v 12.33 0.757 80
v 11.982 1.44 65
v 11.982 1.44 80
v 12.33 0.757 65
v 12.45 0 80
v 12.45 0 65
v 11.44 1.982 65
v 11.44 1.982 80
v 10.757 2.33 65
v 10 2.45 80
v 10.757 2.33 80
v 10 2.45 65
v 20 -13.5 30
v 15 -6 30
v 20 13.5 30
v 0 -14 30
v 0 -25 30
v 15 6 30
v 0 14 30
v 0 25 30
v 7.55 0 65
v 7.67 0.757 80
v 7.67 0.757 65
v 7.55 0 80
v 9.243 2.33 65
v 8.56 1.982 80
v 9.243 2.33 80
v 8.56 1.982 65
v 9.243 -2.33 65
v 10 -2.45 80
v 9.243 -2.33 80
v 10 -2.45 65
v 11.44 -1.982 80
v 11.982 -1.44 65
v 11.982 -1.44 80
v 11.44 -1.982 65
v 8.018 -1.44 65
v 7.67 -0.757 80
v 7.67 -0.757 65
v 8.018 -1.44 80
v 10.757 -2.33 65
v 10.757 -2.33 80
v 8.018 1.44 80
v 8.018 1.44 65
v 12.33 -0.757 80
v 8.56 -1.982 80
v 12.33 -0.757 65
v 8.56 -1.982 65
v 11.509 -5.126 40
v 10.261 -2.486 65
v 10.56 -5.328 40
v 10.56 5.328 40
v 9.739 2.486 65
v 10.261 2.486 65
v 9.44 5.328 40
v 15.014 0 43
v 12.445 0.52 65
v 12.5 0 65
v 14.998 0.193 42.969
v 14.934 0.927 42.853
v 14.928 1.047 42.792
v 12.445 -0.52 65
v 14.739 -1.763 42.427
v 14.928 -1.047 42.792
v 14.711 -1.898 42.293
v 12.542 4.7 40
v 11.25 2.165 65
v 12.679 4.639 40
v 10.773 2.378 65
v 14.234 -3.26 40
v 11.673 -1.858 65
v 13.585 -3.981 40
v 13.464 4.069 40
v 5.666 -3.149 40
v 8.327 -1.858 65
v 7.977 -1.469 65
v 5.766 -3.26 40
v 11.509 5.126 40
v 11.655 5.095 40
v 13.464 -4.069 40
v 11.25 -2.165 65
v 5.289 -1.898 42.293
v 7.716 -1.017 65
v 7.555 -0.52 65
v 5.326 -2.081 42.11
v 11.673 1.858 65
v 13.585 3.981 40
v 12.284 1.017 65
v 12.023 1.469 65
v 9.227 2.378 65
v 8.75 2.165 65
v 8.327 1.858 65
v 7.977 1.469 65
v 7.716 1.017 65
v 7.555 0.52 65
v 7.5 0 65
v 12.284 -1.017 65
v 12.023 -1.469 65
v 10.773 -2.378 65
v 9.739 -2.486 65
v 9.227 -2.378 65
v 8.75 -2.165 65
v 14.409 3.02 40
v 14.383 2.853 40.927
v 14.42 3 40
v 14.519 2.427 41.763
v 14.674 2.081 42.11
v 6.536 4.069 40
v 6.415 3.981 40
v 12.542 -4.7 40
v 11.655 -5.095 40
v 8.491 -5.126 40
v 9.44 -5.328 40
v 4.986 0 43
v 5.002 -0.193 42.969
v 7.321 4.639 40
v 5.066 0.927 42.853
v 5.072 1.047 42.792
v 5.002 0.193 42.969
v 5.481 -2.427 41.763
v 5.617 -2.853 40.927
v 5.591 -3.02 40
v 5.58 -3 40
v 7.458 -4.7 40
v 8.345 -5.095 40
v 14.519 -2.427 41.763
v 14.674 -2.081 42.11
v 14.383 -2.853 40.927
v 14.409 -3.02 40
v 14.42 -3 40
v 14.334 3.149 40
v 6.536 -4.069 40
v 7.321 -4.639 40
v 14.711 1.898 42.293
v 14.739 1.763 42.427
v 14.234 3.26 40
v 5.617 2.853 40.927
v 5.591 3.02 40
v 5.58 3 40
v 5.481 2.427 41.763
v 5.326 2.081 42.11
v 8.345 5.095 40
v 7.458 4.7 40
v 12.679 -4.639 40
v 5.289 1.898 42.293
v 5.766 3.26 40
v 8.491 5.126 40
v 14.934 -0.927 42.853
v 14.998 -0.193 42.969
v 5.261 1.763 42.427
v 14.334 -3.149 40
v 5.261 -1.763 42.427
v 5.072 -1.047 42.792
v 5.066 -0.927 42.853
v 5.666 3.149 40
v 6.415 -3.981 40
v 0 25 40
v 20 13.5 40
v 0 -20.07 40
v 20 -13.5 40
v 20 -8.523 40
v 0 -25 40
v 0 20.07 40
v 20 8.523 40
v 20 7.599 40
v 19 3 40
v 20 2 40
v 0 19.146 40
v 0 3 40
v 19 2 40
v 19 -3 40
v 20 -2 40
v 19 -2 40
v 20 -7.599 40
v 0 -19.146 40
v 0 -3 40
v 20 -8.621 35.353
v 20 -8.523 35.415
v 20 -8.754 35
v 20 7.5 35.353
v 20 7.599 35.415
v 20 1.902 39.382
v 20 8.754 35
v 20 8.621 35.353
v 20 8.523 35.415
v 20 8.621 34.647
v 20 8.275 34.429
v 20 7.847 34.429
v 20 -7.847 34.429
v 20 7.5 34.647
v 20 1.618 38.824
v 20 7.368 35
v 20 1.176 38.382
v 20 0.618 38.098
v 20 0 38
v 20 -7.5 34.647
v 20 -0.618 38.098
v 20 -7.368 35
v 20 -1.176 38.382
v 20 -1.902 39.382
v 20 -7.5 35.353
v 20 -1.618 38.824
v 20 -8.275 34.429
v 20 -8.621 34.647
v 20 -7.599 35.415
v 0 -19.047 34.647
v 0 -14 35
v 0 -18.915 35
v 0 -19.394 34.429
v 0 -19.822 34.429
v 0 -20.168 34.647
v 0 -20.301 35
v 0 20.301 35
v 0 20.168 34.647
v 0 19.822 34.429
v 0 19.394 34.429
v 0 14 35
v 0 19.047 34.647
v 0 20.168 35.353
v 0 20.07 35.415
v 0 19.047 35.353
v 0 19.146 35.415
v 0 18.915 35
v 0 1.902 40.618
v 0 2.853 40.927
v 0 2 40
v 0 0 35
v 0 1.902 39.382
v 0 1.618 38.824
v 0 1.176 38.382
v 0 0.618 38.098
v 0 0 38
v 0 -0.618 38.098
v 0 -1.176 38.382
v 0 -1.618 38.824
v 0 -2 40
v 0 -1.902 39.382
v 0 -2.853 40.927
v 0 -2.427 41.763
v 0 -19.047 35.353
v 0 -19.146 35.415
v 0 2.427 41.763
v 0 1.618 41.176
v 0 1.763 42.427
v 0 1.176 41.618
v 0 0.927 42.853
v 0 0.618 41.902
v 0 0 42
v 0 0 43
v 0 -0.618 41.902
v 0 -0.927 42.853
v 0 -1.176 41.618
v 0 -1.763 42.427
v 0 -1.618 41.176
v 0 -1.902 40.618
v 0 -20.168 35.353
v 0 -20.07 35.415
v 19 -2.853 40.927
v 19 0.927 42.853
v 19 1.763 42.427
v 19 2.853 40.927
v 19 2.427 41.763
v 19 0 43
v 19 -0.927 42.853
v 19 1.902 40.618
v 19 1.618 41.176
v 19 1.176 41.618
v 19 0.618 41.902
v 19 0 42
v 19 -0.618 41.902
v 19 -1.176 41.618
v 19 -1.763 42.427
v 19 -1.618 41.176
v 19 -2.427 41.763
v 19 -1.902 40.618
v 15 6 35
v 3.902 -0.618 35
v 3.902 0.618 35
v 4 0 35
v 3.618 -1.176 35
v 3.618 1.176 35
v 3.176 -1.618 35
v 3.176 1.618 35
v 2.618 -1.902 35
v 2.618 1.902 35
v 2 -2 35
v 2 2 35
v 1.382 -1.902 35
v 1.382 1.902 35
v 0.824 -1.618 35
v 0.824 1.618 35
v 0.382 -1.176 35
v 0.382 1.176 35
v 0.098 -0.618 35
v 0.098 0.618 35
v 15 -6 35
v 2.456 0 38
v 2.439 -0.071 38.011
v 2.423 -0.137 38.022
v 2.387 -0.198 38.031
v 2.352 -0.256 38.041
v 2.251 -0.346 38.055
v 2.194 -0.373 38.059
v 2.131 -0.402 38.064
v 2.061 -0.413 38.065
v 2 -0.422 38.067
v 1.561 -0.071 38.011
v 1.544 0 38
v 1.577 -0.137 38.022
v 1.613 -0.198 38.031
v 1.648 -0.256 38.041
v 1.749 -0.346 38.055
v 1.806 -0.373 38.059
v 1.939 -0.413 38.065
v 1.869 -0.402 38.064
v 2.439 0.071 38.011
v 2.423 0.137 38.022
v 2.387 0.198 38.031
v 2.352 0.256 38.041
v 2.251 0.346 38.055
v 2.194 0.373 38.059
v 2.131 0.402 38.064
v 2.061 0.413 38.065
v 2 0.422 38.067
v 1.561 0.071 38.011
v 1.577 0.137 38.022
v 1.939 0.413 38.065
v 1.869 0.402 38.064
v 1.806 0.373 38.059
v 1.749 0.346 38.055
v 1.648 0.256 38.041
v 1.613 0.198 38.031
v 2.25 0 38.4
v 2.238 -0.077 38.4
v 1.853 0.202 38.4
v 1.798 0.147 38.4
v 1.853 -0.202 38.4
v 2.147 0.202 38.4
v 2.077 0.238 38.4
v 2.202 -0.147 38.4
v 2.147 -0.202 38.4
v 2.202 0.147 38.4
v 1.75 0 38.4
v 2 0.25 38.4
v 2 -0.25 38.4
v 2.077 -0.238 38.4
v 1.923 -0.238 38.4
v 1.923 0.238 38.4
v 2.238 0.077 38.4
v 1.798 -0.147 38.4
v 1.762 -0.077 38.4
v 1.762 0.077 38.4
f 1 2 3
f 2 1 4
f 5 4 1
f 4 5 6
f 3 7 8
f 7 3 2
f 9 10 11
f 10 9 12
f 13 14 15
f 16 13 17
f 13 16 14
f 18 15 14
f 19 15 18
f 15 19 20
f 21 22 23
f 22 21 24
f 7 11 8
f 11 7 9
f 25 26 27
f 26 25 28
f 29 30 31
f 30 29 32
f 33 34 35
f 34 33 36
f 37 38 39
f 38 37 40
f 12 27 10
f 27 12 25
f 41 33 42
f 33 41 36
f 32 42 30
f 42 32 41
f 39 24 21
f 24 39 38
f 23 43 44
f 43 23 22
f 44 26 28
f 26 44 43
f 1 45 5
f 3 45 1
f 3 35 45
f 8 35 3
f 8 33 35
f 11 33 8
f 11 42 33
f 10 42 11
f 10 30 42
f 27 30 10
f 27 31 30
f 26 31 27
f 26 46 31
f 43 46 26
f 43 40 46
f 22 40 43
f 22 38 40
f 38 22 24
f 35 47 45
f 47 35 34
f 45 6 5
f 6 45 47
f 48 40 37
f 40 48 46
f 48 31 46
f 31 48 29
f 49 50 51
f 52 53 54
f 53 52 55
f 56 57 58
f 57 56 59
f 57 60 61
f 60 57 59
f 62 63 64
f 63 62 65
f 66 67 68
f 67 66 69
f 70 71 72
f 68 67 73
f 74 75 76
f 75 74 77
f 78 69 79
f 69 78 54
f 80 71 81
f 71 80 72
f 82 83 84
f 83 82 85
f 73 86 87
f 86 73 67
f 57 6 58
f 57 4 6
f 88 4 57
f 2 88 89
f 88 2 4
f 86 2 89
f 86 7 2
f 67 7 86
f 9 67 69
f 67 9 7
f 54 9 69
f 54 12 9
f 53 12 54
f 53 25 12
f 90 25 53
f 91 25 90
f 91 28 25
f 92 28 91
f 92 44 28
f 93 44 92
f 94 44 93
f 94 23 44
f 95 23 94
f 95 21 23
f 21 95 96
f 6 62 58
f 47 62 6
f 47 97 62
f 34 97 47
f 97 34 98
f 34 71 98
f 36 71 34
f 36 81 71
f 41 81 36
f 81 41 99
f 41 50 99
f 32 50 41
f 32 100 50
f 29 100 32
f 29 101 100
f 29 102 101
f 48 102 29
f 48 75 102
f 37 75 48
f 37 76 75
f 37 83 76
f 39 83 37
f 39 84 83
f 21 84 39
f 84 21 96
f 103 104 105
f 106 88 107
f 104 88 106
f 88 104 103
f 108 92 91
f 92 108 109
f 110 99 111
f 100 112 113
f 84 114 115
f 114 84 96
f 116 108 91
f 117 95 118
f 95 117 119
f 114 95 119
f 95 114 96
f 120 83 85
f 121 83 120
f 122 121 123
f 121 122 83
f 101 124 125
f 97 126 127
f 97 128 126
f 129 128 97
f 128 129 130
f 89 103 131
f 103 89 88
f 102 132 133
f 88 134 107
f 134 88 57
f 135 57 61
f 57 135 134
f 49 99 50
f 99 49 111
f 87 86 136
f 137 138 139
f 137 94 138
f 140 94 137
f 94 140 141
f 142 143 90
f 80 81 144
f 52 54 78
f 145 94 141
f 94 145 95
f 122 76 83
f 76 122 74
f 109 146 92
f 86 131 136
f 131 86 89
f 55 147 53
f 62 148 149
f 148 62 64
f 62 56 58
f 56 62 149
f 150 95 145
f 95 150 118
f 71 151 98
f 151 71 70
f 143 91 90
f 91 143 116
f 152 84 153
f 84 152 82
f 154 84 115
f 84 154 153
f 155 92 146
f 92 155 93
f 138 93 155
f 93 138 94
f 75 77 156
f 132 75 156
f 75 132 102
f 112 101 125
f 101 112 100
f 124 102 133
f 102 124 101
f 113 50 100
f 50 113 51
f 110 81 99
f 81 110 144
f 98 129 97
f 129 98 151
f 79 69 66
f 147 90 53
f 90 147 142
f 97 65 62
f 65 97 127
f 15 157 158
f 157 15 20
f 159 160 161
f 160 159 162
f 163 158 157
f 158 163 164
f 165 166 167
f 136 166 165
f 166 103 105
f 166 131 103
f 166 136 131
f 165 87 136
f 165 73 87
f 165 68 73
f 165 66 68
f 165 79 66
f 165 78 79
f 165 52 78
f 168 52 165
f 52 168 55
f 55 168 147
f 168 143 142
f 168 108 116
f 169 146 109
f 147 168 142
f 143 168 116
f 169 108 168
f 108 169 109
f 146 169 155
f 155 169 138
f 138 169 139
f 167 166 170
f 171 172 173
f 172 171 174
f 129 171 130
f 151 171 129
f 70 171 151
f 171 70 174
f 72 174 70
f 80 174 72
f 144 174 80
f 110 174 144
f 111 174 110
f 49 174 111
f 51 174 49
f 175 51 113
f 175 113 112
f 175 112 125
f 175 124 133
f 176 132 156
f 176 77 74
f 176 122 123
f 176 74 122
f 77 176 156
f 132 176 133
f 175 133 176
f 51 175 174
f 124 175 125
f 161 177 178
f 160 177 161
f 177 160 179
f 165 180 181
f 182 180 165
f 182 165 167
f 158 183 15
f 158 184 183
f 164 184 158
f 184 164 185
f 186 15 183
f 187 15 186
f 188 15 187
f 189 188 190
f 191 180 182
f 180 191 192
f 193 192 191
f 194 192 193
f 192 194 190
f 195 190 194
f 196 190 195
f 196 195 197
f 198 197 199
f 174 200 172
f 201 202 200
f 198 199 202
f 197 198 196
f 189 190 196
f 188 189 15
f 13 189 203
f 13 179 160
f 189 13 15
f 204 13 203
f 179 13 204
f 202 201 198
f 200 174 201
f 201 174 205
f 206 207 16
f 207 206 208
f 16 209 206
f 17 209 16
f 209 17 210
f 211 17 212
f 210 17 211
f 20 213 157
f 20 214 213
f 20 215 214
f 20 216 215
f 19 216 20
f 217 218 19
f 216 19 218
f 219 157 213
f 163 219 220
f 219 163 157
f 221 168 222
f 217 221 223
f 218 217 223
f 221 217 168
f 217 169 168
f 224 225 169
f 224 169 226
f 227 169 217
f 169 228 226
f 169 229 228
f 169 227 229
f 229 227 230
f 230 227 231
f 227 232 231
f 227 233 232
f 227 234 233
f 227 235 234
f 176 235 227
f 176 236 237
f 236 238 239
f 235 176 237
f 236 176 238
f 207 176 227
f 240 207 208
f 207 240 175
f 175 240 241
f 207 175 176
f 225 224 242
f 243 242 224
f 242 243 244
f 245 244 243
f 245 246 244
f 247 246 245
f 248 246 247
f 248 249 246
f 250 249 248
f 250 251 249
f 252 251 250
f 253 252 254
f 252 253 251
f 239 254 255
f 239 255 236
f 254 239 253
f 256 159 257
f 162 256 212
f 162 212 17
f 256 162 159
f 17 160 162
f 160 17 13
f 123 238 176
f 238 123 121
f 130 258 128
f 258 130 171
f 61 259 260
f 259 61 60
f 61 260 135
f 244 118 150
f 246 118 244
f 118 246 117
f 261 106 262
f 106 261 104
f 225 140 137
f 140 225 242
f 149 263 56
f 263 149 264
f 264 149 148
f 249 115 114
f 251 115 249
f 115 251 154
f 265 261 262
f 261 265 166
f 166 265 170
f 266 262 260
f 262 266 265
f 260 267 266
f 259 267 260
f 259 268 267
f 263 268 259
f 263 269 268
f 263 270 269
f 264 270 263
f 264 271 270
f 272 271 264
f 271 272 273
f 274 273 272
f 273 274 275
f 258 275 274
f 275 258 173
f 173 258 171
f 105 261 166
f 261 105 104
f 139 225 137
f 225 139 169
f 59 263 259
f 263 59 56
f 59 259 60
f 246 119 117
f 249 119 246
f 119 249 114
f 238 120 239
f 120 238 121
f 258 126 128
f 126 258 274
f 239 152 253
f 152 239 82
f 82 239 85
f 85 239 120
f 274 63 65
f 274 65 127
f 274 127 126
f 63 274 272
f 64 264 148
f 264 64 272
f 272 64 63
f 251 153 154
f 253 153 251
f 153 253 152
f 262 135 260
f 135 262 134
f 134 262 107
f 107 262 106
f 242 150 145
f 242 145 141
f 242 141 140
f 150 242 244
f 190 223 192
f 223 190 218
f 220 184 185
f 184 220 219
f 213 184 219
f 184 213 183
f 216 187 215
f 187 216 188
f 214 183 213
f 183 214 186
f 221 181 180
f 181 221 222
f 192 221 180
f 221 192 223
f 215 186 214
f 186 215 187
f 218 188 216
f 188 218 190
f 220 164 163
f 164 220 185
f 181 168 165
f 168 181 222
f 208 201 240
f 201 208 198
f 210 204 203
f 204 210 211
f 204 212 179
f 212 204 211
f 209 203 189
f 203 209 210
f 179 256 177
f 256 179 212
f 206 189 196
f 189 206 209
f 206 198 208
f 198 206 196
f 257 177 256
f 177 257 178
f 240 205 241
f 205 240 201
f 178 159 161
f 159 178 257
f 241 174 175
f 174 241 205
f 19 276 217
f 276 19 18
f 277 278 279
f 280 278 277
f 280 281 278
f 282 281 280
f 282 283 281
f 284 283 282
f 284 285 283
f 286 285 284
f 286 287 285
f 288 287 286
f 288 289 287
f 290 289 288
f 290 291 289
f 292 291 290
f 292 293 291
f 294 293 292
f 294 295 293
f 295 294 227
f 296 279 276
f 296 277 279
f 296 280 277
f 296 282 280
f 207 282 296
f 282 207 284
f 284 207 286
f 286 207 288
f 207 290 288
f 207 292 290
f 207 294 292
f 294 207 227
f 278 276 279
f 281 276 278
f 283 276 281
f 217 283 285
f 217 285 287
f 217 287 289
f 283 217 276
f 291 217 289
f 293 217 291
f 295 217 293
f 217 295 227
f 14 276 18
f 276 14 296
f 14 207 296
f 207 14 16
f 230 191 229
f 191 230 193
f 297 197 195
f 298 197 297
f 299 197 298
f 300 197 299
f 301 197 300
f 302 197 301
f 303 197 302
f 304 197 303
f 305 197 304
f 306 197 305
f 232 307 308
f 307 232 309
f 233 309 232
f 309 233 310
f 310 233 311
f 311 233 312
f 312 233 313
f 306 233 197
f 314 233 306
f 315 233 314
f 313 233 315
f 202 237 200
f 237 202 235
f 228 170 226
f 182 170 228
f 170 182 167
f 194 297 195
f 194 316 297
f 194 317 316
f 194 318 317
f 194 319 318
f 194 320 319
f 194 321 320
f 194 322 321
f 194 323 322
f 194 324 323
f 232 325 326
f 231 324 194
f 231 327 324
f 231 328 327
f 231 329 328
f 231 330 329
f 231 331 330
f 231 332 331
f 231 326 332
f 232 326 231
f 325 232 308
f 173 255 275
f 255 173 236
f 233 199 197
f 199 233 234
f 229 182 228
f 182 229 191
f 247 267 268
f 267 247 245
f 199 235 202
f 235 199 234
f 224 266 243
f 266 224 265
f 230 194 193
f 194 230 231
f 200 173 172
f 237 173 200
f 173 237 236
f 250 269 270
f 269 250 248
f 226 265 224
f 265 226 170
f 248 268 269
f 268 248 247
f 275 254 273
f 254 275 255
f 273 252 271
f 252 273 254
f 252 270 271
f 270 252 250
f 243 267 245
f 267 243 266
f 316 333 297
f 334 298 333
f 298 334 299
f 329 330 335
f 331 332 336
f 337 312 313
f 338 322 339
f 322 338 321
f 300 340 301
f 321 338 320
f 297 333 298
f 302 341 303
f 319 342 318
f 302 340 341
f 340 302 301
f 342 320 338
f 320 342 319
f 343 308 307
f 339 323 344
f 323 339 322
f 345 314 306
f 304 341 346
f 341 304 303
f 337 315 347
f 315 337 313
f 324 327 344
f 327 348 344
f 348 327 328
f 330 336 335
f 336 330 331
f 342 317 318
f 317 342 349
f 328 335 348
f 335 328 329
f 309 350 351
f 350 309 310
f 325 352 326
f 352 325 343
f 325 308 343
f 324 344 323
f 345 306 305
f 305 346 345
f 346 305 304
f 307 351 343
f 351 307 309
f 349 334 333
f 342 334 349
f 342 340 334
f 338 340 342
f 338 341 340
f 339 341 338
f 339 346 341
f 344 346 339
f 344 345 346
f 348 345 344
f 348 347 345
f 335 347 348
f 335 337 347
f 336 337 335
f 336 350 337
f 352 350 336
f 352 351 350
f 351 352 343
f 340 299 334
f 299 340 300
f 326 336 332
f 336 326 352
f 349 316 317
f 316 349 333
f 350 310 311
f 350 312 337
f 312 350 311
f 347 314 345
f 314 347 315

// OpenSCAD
module slidingSlot(){
	difference(){
		rotate_extrude(){
			translate([40,0,0])
			polygon(points=[[0,0],[16,0],[16,10],[11,10],[11,7],[13,4],[13,3],[3,3],[3,4],[5,7],[5,10],[0,10]]);
		}
		translate([0,0,-5])
		linear_extrude(height=20)
		polygon(points=[[60,60],[-60,60],[0,0],[-60,-60],[60,-60]]);
	}
}

module waterNeedleHolder(xx,yy,zz){
	difference(){
		union(){
			// translate([5,0,zz+8])
			// rotate([90,0,90])
			// linear_extrude(height=15)
			// polygon(points=[[1,0],[1,5],[2,5],[0,12],[-2,5],[-1,5],[-1,0]]);
			
			//Top Scaffold Adaptor
			translate([10,0,zz]){
				cylinder(d=4.9,h=50,$fn=20);
				cylinder(d1=13,d2=5,h=35,$fn=30);
			}
		
			//Base
			translate([xx,yy,zz])
			linear_extrude(height=10)
			polygon(points=[[20,13.5],[20,-13.5],[0,-25],[0,25]]);

			//Odor Tube
			translate([xx,yy,zz+10])
			rotate([0,90,0])	
			cylinder(h=19,d=6,$fn=20);
			
			//Back Odor Tube Adaptor
			// translate([xx,yy,zz+9])
			// rotate([0,-90,0])
			// rotate_extrude($fn=20)
			// polygon(points=[[0,0],[1.2,0],[1.2,4],[1.4,4],[0,8]]);			
		}
		
		//Bottom Groove
		translate([xx,yy,zz-5])
		linear_extrude(height=10)
		polygon(points=[[15,6],[15,-6],[0,-14],[0,14]]);

		// //Nose Groove
		// translate([xx+18,yy,zz+16])
		// rotate([0,90,0])
		// cylinder(h=20,d=20,$fn=80);
		
		// //Odor Tube
		// translate([xx+5,yy,zz+9])
		// rotate([0,90,0])
		// cylinder(h=32,d=2.5,$fn=20);
		
		//Odor Tube
		translate([xx-15,yy,zz+10])
		rotate([0,90,0])
		cylinder(h=60,d=4,$fn=20);
		
		//Left Needle Slot
		translate([xx-18,yy+30,zz+5])
		rotate([90,0,60]){
			cylinder(d=1.2,h=55,$fn=10);
			translate([-0.4,0,0])
			cube([0.8,10,55]);
		}
		
		//Right Needle Slot
		translate([xx-18,yy-30,zz+5])
		rotate([-90,0,-60]){
			cylinder(d=1.2,h=55,$fn=10);
			translate([-0.4,-10,0])
			cube([0.8,10,55]);
		}
	}
	
	translate([2,0,zz+5]){
		cylinder(d1=4,d2=0.5,h=3.4,$fn=20);
	}
}

module measureCube(){
	translate([29,-2.25,0])
	cube([20,4.5,4.5]);
}


module functionColumn(){
	
}

module mousePlatform(){
	translate([0,-100,0])
	color("grey",1.0){
		cube([200,200,10]);
		translate([60,50,0])
		cube([20,100,20]);
	}
	translate([50,0,37.5])
	rotate([0,90,0])
	{
		difference(){	
			difference(){
				color("white",0.7){
					cylinder(d=45,h=150);
				}
				translate([0,0,-10])
				cylinder(d=35,h=170);
			}
			translate([-30,-50,-10])
			cube([20,100,170]);
		}
	}
}


// mousePlatform();
// translate([70,0,20])
// slidingSlot();

waterNeedleHolder(0,0,30);

//measureCube();
